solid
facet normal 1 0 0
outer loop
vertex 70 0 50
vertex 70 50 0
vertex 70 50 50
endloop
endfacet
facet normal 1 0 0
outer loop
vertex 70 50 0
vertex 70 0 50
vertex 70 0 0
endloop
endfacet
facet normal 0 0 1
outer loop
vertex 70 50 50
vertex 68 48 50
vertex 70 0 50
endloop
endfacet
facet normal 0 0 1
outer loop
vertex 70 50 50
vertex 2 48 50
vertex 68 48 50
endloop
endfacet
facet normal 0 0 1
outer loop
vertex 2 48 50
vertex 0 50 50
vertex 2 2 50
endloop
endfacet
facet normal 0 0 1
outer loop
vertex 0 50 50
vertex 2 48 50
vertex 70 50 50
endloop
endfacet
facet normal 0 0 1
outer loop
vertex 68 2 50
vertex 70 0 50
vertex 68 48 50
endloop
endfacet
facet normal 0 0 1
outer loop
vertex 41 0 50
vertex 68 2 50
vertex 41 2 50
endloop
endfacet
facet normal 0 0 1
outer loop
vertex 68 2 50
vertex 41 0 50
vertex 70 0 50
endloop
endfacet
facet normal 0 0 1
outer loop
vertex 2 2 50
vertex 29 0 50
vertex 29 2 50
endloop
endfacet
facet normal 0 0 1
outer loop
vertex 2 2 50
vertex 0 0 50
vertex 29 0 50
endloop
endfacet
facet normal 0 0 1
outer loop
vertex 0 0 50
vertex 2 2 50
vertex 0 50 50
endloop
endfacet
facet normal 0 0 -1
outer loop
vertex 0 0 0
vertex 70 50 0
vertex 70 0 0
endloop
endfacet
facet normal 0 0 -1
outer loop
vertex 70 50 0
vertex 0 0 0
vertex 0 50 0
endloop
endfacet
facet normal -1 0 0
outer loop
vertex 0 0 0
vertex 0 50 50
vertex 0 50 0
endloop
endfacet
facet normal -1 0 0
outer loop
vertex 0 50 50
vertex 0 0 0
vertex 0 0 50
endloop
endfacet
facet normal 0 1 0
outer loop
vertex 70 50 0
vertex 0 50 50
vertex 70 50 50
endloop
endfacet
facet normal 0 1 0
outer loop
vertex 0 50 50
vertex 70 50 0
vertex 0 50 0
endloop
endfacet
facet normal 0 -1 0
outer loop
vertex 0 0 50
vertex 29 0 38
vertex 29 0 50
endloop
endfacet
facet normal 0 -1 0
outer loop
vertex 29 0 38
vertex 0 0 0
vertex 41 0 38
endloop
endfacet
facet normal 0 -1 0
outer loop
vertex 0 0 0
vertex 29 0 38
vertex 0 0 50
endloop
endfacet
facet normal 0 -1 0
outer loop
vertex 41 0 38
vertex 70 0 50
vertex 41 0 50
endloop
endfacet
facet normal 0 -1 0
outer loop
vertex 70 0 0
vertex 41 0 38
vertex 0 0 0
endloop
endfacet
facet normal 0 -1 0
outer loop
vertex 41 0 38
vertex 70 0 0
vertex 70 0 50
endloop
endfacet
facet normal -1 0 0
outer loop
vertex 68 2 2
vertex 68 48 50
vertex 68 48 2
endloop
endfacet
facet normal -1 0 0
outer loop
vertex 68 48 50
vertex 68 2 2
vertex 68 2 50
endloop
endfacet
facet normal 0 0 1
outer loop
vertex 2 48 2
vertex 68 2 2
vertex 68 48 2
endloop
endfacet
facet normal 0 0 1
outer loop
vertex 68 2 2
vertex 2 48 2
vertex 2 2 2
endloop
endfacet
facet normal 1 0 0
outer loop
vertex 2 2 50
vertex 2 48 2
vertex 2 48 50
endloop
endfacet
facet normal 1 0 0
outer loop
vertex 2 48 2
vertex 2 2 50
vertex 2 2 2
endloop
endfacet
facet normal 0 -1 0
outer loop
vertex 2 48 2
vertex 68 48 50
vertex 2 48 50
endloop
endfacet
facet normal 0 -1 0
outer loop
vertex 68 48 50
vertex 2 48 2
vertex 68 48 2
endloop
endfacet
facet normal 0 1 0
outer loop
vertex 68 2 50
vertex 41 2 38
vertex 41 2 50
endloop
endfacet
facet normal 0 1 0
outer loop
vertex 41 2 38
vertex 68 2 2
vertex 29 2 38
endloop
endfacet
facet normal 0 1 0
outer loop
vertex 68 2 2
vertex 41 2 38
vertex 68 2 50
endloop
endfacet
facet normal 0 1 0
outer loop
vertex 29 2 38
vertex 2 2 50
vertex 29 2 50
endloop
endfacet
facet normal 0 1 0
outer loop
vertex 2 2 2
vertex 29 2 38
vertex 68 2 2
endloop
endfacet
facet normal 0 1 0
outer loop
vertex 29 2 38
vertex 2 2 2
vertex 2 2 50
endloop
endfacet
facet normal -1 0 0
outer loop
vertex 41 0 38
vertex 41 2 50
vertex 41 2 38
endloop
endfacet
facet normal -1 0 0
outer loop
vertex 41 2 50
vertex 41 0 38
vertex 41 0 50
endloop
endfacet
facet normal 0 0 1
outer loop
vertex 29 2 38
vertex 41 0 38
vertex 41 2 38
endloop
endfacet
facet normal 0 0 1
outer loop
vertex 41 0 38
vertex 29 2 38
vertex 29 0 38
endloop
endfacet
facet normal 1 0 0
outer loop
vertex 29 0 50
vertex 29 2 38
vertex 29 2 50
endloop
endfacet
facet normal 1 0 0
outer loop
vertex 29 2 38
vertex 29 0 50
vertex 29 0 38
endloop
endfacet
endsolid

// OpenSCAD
$fn = 32;

// ----------------------------------------------------------------------
// Enclosure box: notch enclosure
// ----------------------------------------------------------------------

// --- parameters (mm) ---
box_l = 70;               // outer length, X
box_w = 50;               // outer width, Y
box_h = 50;               // outer height
wall_t = 2;               // wall thickness
notch_w = 12;             // cable notch width
notch_h = 12;             // cable notch height

inner_h = box_h - wall_t;  // cavity depth
boss_h = inner_h - 2;  // corner boss height

difference() {
  union() {
    difference() {
      cube([box_l, box_w, box_h]);
      translate([wall_t, wall_t, wall_t])
        cube([box_l - 2 * wall_t, box_w - 2 * wall_t, box_h]);
    }
  }
  translate([box_l / 2 - notch_w / 2, -1, box_h - notch_h])
    cube([notch_w, wall_t + 2, notch_h + 1]);
}
